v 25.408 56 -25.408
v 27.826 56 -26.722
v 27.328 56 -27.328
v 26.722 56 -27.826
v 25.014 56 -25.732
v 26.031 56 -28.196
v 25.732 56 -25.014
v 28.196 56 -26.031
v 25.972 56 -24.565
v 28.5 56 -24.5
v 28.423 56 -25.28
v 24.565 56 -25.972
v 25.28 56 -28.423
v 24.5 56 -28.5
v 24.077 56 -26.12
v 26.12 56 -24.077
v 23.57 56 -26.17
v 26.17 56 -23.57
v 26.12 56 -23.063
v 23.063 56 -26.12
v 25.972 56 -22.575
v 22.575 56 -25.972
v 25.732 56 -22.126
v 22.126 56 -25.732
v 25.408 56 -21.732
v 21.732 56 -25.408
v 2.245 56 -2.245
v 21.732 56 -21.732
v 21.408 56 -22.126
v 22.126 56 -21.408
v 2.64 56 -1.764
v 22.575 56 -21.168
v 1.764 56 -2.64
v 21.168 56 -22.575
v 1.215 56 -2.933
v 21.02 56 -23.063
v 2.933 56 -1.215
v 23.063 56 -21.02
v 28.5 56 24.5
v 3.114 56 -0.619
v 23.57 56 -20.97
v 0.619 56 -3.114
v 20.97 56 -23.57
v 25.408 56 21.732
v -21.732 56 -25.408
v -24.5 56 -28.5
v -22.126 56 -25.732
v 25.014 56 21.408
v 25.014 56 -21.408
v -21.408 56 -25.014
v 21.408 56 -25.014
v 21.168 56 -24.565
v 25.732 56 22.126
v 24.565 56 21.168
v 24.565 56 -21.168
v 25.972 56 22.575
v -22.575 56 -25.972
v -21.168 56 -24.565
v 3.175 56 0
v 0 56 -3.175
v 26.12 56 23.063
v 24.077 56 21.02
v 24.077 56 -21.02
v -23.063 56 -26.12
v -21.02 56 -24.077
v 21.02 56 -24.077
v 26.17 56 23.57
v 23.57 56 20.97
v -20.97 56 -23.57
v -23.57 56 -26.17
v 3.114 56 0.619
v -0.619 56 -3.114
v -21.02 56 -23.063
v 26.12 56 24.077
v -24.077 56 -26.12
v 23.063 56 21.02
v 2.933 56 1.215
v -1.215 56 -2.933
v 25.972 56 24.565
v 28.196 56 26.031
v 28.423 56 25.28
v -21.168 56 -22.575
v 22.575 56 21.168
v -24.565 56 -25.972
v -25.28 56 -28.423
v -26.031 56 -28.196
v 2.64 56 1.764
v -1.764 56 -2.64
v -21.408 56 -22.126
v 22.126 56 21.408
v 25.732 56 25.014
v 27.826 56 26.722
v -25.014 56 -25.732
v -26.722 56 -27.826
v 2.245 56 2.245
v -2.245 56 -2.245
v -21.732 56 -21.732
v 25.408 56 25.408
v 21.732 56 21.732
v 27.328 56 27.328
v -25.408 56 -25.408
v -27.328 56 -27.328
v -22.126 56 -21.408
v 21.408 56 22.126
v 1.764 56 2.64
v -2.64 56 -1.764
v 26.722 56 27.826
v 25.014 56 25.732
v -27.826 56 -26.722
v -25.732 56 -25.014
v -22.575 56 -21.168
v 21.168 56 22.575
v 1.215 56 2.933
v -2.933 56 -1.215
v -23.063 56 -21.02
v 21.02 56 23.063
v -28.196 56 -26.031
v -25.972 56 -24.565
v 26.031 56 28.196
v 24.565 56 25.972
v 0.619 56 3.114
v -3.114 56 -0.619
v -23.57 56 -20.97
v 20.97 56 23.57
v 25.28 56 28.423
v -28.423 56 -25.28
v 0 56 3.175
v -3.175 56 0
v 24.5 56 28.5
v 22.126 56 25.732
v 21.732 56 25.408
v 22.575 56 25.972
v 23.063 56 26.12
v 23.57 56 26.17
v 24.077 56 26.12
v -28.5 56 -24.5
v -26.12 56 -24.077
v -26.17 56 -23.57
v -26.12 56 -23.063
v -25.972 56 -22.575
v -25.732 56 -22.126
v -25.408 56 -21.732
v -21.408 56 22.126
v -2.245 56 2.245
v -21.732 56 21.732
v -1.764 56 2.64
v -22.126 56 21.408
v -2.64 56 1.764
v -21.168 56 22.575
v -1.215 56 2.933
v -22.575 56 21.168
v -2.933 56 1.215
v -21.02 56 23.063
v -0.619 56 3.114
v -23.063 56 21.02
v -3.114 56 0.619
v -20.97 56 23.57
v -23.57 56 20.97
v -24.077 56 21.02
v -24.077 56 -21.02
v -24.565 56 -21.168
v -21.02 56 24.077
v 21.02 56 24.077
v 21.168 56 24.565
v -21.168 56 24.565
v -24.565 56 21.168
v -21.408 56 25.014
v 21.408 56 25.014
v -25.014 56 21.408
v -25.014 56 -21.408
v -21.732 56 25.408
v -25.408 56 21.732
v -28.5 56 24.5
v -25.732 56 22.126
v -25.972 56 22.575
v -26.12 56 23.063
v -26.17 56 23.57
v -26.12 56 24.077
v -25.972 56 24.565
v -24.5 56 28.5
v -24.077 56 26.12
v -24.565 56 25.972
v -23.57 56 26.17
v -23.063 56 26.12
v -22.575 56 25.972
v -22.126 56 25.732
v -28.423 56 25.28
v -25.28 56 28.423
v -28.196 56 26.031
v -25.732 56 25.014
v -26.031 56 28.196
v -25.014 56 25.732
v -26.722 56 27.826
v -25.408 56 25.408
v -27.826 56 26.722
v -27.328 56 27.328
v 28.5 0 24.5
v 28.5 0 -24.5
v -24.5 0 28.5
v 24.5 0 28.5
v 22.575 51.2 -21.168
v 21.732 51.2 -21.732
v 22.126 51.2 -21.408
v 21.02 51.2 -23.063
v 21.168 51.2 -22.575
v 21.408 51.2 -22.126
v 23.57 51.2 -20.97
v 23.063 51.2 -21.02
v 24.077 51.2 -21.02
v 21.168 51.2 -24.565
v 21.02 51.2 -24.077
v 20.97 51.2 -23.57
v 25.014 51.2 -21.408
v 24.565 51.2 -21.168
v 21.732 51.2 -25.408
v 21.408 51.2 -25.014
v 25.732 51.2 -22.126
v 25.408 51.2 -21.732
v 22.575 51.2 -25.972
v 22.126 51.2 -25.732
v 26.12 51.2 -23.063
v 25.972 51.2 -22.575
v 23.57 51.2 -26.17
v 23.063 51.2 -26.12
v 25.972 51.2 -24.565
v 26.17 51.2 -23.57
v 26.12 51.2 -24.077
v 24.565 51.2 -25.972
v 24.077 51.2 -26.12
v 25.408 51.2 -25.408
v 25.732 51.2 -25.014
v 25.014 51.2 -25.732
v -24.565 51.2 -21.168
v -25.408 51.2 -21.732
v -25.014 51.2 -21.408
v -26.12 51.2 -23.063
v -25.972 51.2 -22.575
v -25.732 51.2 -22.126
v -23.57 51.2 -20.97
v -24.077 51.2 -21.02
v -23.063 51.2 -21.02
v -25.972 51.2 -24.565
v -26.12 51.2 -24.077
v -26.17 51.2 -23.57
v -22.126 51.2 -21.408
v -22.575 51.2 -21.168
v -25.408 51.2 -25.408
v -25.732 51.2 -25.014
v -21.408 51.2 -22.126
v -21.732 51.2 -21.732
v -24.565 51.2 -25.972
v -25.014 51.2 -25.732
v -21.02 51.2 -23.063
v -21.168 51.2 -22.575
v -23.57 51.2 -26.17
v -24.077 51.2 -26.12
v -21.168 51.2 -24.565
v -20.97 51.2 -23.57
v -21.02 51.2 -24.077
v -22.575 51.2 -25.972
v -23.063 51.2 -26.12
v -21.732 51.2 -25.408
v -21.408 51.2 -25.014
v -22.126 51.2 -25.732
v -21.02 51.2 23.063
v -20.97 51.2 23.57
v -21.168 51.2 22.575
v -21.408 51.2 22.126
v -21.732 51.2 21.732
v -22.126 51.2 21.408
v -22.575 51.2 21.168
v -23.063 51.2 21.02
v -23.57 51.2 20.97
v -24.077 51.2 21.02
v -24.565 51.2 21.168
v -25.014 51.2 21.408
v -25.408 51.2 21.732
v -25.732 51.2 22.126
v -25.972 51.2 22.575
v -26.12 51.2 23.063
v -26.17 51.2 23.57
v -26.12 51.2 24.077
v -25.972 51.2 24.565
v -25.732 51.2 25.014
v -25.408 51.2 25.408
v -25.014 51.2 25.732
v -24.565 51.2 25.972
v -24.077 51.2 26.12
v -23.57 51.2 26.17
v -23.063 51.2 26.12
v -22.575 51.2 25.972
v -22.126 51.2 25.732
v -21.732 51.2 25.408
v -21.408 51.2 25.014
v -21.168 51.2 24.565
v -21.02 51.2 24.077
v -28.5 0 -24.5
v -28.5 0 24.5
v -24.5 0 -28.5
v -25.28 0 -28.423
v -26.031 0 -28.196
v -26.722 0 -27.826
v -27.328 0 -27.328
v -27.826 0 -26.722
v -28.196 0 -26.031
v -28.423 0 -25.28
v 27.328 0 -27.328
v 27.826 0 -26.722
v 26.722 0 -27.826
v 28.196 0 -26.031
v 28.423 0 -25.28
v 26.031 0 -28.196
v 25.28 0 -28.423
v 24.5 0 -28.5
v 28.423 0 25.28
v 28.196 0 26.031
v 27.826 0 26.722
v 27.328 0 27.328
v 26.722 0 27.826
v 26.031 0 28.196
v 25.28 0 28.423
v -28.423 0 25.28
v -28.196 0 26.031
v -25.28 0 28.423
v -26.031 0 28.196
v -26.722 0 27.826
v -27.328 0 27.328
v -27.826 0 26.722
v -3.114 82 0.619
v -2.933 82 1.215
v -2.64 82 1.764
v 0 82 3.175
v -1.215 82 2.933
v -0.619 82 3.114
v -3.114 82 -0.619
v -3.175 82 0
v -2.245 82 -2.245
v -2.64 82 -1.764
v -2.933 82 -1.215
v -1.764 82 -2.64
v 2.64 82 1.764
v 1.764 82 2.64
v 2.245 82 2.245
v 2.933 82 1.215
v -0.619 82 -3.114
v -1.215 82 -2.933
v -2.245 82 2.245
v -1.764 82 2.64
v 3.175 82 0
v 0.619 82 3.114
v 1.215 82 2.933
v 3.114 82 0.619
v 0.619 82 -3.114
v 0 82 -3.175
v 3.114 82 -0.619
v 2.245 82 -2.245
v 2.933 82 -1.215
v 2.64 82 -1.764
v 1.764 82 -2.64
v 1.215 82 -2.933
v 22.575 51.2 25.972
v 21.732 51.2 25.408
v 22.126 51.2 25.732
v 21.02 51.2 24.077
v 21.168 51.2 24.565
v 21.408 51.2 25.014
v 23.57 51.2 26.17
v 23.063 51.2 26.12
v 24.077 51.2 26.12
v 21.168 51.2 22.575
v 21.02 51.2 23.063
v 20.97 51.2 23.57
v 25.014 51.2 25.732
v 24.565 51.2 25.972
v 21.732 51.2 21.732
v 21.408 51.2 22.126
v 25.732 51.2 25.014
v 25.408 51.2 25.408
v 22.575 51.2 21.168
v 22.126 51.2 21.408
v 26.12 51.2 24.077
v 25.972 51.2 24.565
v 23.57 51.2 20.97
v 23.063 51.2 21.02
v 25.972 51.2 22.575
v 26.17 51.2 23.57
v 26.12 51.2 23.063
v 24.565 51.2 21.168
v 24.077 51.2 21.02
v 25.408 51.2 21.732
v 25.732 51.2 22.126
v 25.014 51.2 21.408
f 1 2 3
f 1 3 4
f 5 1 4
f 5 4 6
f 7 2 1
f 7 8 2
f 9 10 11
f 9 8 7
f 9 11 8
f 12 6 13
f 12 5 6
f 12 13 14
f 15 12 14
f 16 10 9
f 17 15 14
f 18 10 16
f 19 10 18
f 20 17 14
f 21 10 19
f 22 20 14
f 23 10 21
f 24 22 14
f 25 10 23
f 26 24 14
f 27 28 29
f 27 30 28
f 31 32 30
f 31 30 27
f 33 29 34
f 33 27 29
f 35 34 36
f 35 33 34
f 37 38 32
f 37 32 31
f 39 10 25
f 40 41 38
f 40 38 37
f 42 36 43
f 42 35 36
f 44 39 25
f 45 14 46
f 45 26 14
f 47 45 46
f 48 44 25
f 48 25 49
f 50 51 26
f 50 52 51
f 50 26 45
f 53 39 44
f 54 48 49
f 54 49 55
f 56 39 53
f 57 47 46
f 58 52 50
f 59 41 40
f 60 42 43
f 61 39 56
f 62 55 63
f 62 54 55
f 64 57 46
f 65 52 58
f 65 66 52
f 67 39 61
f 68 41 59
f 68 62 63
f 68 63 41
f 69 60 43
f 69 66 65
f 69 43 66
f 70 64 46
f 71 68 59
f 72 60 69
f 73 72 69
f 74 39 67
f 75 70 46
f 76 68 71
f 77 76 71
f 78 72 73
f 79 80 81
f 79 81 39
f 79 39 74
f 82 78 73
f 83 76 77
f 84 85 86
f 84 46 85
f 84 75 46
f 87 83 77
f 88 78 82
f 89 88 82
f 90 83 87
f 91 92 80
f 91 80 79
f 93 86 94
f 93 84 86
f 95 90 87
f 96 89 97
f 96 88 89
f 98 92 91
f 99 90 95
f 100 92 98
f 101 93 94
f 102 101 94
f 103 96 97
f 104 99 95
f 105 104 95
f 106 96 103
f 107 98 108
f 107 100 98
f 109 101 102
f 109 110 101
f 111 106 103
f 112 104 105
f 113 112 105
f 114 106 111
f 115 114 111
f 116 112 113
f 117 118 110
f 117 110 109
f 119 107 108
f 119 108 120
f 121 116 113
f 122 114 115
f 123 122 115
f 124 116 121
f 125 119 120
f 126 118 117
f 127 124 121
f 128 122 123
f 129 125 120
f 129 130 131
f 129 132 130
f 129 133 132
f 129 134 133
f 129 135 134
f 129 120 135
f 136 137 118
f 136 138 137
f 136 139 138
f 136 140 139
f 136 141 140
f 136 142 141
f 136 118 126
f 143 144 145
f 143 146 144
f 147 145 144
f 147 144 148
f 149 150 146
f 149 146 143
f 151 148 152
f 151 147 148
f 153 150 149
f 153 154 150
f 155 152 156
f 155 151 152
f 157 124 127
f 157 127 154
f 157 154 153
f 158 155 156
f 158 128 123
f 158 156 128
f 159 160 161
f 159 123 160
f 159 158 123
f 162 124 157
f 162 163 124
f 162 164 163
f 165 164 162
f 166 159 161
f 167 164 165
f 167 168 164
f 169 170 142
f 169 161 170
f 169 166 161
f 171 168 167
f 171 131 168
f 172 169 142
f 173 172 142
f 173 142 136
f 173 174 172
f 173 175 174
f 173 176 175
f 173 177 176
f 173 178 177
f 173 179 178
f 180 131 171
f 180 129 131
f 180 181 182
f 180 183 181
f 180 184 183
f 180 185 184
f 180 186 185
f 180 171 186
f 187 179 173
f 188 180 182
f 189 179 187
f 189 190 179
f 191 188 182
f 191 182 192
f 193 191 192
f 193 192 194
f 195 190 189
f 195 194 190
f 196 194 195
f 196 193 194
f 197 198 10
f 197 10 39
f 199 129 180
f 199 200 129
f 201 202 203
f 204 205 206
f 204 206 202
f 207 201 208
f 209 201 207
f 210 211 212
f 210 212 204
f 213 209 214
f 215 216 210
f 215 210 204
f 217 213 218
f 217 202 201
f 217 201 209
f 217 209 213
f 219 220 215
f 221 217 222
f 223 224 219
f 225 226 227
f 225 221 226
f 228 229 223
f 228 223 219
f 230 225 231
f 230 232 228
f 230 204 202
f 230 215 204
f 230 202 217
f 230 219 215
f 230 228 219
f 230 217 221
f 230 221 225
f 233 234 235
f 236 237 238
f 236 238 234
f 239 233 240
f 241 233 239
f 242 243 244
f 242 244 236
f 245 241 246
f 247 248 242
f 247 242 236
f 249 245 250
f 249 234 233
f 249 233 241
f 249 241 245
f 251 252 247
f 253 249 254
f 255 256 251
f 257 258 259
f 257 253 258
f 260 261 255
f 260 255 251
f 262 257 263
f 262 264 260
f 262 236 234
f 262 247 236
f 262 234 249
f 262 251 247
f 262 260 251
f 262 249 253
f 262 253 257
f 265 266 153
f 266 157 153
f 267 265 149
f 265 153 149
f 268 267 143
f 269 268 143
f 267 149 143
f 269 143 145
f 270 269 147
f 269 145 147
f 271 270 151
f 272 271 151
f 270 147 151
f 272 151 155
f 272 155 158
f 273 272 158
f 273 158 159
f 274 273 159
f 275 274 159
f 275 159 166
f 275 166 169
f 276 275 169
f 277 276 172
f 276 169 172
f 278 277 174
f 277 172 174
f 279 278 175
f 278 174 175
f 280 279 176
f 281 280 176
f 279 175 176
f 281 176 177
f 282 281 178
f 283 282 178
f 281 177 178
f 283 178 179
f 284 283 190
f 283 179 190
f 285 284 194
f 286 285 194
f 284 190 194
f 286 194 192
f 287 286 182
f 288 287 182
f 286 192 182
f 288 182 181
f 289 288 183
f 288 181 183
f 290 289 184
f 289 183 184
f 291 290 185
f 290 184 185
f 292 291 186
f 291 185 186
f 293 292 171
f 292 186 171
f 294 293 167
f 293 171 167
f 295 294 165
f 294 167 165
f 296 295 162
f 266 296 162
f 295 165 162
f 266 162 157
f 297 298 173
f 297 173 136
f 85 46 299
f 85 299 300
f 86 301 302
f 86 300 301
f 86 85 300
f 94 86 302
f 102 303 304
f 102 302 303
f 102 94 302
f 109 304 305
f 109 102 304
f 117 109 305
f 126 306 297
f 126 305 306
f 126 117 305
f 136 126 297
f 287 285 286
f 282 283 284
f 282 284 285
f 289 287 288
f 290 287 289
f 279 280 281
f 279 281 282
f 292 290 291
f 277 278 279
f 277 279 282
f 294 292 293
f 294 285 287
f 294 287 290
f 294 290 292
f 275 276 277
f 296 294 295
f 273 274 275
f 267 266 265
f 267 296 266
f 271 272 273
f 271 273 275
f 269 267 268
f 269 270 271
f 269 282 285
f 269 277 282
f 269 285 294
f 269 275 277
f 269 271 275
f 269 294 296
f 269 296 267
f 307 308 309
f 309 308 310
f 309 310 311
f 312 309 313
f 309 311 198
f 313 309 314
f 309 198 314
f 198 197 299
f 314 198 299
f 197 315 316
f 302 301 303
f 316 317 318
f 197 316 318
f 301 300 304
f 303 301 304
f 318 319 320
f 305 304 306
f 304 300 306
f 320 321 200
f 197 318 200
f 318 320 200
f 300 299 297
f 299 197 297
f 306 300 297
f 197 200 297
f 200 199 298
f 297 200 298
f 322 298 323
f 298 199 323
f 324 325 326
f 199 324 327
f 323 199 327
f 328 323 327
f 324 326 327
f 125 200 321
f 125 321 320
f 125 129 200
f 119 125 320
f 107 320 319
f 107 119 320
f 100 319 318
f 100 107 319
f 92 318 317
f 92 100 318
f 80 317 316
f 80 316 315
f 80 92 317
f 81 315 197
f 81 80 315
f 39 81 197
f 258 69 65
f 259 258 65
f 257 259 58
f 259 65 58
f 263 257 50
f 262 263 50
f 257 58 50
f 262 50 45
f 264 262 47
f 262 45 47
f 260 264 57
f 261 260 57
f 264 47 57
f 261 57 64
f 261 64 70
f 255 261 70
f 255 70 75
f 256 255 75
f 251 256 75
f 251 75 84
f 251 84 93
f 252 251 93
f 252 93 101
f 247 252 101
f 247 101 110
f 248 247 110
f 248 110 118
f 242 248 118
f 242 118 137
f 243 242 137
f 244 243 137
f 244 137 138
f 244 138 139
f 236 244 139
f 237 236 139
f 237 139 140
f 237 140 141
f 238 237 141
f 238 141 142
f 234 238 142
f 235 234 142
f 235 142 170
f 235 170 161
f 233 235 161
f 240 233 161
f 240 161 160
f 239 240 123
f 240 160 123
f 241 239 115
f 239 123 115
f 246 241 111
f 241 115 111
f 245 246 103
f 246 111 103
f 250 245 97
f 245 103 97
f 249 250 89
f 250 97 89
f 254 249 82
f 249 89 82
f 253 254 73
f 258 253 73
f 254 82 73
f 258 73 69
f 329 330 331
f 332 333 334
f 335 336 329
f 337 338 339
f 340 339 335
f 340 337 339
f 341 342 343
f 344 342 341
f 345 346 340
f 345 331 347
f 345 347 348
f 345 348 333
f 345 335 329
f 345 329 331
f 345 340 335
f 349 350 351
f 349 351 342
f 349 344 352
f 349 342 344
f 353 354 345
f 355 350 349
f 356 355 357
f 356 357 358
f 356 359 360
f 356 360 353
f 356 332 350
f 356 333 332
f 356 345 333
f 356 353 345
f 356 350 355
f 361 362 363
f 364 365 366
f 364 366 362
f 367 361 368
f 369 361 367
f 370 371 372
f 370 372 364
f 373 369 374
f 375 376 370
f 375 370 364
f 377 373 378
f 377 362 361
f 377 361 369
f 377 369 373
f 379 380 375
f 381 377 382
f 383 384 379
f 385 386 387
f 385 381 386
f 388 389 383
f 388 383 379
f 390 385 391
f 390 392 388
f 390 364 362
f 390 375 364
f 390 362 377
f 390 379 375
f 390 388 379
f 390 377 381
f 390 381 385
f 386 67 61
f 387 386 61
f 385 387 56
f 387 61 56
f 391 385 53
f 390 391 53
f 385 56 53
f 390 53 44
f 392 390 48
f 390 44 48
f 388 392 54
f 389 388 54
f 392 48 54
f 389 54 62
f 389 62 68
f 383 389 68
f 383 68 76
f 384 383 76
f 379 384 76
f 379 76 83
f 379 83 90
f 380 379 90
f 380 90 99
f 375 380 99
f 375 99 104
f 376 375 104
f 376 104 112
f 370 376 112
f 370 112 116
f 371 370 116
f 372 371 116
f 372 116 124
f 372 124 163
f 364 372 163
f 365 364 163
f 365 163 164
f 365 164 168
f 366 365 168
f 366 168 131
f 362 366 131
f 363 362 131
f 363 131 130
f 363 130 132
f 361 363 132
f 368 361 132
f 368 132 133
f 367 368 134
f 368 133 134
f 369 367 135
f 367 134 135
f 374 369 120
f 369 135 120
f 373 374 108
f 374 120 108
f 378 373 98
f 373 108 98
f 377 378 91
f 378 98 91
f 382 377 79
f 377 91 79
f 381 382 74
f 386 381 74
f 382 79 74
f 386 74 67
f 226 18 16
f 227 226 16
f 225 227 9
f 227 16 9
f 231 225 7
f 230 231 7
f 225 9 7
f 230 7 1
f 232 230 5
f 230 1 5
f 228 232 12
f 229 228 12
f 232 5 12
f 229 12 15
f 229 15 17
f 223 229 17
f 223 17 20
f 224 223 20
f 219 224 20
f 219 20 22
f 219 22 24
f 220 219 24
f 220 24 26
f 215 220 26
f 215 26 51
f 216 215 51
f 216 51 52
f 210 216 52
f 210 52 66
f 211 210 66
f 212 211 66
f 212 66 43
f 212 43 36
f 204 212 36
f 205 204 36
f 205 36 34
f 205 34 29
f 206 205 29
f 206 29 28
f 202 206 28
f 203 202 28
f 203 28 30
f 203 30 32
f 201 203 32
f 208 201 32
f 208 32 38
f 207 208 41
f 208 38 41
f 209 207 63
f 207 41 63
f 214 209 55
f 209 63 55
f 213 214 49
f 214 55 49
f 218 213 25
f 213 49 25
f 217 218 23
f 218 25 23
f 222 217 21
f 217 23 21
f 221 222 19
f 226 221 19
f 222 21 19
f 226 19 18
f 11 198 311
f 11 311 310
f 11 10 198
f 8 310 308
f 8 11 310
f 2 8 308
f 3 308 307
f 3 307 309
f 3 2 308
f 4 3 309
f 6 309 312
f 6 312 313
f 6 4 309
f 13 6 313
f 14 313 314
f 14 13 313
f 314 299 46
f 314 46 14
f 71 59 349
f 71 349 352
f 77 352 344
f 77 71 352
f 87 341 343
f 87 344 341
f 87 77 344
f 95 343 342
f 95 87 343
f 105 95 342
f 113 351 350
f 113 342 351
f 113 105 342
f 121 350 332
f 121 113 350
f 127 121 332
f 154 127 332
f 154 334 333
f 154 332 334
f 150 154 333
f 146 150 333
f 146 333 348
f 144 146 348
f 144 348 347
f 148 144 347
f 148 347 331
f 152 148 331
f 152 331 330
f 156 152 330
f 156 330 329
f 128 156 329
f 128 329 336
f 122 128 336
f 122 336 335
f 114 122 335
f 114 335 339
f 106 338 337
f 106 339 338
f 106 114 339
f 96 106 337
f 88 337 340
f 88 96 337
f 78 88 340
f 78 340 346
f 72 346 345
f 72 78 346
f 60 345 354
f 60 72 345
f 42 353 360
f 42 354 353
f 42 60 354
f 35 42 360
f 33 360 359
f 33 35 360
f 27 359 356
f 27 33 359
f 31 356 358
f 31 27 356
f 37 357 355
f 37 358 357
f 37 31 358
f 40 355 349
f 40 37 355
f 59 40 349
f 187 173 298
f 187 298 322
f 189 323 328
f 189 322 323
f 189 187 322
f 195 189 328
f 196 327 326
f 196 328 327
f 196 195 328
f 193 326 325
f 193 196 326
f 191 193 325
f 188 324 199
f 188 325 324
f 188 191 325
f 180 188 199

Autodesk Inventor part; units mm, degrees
ref_plane "YZ Plane" through (0, 0, 0) normal (1, 0, 0) x (0, 1, 0)
ref_plane "XZ Plane" through (0, 0, 0) normal (0, 1, 0) x (-1, 0, 0)
ref_plane "XY Plane" through (0, 0, 0) normal (0, 0, 1) x (1, 0, 0)
sketch "Sketch1" plane through (0, 0, 0) normal (0, 1, 0) x (-1, 0, 0)
  line L0 (-28.5, 28.5) -> (28.5, 28.5)
  line L1 (28.5, 28.5) -> (28.5, -28.5)
  line L2 (28.5, -28.5) -> (-28.5, -28.5)
  line L3 (-28.5, -28.5) -> (-28.5, 28.5)
  line L4 (-28.5, 28.5) -> (28.5, -28.5) construction
  line L5 (28.5, 28.5) -> (-28.5, -28.5) construction
  point P0 (0, 0)
  dimension "d0" = 57
  dimension "d1" = 57
extrude "Extrusion1" add sketch "Sketch1" along normal blind 56
sketch "Sketch2" plane through (0, 56, 0) normal (0, 1, 0) x (1, 0, 0)
  circle A0 centre (-23.57, 23.57) radius 2.6
  point P0 (0, 0)
  dimension "d6" = 5.2
  dimension "d19" = 23.57
  dimension "d20" = 23.57
extrude "Extrusion2" cut sketch "Sketch2" against normal blind 4.8
pattern_linear "Rectangular Pattern1" count 2 spacing 47.14 along (1, 0, 0) count 2 spacing 47.14 along (0, 0, 1) of "Extrusion2"
fillet "Fillet1" radius 4 4 edges at (28.5, 28, -28.5) (-28.5, 28, -28.5) (28.5, 28, 28.5) (-28.5, 28, 28.5)
sketch "Sketch3" plane through (0, 56, 0) normal (0, 1, 0) x (1, 0, 0)
  circle A0 centre (0, 0) radius 3.175
  dimension "d16" = 6.35
extrude "Extrusion3" add sketch "Sketch3" along normal blind 26
properties part number "Motor Nema23"
